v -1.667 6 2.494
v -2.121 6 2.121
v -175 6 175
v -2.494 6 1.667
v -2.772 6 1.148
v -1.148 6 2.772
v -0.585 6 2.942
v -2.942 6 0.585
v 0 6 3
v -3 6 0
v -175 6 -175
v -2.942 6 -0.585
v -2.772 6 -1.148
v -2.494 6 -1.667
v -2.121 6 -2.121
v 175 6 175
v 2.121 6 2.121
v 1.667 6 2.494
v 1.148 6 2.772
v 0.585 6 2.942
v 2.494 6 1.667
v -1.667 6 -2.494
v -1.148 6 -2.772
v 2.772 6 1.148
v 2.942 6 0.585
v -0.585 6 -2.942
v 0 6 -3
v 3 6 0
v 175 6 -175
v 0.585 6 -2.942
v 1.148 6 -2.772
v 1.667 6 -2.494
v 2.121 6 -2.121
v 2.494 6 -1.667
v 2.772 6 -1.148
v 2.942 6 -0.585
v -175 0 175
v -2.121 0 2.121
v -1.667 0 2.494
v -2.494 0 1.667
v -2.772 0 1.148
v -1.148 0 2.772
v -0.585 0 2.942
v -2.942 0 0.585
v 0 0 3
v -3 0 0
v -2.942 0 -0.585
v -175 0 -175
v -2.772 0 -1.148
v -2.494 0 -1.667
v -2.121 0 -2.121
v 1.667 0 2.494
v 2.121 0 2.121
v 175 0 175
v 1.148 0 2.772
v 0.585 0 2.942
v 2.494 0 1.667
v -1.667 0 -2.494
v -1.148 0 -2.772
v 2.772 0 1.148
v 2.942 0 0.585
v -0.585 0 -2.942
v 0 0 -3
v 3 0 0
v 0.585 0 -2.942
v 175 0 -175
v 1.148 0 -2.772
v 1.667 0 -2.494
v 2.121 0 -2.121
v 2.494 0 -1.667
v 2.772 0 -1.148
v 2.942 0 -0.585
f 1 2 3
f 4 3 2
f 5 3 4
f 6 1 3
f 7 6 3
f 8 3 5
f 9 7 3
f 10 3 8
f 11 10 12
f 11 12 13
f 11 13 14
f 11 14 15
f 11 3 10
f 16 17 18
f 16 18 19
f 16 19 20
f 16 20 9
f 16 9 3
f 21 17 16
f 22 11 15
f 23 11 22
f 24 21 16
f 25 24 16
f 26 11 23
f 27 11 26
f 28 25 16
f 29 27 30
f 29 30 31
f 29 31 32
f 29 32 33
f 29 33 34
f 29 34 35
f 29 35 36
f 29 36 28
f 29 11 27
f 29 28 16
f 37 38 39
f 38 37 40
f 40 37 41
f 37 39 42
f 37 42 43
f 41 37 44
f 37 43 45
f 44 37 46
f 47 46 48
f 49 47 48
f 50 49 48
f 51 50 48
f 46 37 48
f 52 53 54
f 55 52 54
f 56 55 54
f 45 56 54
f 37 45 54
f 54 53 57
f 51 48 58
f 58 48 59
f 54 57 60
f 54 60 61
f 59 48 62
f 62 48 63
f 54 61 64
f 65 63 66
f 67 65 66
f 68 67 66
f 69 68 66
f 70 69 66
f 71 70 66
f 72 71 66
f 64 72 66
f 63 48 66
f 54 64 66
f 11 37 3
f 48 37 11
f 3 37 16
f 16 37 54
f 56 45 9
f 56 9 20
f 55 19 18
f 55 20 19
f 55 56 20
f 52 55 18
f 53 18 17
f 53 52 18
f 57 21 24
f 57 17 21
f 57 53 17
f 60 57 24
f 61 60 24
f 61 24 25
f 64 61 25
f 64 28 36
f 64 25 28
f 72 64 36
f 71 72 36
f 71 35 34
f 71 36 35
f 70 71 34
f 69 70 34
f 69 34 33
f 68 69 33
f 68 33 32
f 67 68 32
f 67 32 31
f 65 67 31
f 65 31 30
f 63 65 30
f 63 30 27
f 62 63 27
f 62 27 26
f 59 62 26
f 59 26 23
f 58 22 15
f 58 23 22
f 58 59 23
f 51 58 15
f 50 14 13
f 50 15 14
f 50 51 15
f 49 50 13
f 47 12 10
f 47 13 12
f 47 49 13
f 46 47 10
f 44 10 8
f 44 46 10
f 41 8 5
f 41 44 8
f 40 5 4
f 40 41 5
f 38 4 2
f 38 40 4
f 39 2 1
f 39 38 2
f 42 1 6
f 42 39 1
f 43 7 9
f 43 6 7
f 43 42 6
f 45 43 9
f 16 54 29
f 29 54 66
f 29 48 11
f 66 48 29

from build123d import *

# Parameters (mm, degrees)
ESQUISSE1_W                  = 350
ESQUISSE1_H                  = 350
BOSS_EXTRU_1_DEPTH           = 6
ENL_V_MAT_EXTRU_1_DEPTH      = 248.560093715
ENL_V_MAT_EXTRU_1_DEPTH_BACK = 248.560093715
ESQUISSE2_R                  = 3


with BuildPart() as part:
    # Esquisse1 → Boss.-Extru.1 (new body)
    with BuildSketch(Plane(origin=(0, 0, 0), x_dir=(1, 0, 0), z_dir=(0, 1, 0))):
        Rectangle(ESQUISSE1_W, ESQUISSE1_H)
    extrude(amount=BOSS_EXTRU_1_DEPTH)

    # Esquisse2 → Enlèv. mat.-Extru.1 (cut, two sides: drawn at the far end of the back side and taken through both)
    with BuildSketch(Plane(origin=(0, 6, 0), x_dir=(1, 0, 0), z_dir=(0, 1, 0)).offset(-ENL_V_MAT_EXTRU_1_DEPTH_BACK)):
        with Locations(Location((0, 0, 0), (0, 0, 270))):
            Circle(ESQUISSE2_R)
    extrude(amount=ENL_V_MAT_EXTRU_1_DEPTH + ENL_V_MAT_EXTRU_1_DEPTH_BACK, mode=Mode.SUBTRACT)


solid = part.part
